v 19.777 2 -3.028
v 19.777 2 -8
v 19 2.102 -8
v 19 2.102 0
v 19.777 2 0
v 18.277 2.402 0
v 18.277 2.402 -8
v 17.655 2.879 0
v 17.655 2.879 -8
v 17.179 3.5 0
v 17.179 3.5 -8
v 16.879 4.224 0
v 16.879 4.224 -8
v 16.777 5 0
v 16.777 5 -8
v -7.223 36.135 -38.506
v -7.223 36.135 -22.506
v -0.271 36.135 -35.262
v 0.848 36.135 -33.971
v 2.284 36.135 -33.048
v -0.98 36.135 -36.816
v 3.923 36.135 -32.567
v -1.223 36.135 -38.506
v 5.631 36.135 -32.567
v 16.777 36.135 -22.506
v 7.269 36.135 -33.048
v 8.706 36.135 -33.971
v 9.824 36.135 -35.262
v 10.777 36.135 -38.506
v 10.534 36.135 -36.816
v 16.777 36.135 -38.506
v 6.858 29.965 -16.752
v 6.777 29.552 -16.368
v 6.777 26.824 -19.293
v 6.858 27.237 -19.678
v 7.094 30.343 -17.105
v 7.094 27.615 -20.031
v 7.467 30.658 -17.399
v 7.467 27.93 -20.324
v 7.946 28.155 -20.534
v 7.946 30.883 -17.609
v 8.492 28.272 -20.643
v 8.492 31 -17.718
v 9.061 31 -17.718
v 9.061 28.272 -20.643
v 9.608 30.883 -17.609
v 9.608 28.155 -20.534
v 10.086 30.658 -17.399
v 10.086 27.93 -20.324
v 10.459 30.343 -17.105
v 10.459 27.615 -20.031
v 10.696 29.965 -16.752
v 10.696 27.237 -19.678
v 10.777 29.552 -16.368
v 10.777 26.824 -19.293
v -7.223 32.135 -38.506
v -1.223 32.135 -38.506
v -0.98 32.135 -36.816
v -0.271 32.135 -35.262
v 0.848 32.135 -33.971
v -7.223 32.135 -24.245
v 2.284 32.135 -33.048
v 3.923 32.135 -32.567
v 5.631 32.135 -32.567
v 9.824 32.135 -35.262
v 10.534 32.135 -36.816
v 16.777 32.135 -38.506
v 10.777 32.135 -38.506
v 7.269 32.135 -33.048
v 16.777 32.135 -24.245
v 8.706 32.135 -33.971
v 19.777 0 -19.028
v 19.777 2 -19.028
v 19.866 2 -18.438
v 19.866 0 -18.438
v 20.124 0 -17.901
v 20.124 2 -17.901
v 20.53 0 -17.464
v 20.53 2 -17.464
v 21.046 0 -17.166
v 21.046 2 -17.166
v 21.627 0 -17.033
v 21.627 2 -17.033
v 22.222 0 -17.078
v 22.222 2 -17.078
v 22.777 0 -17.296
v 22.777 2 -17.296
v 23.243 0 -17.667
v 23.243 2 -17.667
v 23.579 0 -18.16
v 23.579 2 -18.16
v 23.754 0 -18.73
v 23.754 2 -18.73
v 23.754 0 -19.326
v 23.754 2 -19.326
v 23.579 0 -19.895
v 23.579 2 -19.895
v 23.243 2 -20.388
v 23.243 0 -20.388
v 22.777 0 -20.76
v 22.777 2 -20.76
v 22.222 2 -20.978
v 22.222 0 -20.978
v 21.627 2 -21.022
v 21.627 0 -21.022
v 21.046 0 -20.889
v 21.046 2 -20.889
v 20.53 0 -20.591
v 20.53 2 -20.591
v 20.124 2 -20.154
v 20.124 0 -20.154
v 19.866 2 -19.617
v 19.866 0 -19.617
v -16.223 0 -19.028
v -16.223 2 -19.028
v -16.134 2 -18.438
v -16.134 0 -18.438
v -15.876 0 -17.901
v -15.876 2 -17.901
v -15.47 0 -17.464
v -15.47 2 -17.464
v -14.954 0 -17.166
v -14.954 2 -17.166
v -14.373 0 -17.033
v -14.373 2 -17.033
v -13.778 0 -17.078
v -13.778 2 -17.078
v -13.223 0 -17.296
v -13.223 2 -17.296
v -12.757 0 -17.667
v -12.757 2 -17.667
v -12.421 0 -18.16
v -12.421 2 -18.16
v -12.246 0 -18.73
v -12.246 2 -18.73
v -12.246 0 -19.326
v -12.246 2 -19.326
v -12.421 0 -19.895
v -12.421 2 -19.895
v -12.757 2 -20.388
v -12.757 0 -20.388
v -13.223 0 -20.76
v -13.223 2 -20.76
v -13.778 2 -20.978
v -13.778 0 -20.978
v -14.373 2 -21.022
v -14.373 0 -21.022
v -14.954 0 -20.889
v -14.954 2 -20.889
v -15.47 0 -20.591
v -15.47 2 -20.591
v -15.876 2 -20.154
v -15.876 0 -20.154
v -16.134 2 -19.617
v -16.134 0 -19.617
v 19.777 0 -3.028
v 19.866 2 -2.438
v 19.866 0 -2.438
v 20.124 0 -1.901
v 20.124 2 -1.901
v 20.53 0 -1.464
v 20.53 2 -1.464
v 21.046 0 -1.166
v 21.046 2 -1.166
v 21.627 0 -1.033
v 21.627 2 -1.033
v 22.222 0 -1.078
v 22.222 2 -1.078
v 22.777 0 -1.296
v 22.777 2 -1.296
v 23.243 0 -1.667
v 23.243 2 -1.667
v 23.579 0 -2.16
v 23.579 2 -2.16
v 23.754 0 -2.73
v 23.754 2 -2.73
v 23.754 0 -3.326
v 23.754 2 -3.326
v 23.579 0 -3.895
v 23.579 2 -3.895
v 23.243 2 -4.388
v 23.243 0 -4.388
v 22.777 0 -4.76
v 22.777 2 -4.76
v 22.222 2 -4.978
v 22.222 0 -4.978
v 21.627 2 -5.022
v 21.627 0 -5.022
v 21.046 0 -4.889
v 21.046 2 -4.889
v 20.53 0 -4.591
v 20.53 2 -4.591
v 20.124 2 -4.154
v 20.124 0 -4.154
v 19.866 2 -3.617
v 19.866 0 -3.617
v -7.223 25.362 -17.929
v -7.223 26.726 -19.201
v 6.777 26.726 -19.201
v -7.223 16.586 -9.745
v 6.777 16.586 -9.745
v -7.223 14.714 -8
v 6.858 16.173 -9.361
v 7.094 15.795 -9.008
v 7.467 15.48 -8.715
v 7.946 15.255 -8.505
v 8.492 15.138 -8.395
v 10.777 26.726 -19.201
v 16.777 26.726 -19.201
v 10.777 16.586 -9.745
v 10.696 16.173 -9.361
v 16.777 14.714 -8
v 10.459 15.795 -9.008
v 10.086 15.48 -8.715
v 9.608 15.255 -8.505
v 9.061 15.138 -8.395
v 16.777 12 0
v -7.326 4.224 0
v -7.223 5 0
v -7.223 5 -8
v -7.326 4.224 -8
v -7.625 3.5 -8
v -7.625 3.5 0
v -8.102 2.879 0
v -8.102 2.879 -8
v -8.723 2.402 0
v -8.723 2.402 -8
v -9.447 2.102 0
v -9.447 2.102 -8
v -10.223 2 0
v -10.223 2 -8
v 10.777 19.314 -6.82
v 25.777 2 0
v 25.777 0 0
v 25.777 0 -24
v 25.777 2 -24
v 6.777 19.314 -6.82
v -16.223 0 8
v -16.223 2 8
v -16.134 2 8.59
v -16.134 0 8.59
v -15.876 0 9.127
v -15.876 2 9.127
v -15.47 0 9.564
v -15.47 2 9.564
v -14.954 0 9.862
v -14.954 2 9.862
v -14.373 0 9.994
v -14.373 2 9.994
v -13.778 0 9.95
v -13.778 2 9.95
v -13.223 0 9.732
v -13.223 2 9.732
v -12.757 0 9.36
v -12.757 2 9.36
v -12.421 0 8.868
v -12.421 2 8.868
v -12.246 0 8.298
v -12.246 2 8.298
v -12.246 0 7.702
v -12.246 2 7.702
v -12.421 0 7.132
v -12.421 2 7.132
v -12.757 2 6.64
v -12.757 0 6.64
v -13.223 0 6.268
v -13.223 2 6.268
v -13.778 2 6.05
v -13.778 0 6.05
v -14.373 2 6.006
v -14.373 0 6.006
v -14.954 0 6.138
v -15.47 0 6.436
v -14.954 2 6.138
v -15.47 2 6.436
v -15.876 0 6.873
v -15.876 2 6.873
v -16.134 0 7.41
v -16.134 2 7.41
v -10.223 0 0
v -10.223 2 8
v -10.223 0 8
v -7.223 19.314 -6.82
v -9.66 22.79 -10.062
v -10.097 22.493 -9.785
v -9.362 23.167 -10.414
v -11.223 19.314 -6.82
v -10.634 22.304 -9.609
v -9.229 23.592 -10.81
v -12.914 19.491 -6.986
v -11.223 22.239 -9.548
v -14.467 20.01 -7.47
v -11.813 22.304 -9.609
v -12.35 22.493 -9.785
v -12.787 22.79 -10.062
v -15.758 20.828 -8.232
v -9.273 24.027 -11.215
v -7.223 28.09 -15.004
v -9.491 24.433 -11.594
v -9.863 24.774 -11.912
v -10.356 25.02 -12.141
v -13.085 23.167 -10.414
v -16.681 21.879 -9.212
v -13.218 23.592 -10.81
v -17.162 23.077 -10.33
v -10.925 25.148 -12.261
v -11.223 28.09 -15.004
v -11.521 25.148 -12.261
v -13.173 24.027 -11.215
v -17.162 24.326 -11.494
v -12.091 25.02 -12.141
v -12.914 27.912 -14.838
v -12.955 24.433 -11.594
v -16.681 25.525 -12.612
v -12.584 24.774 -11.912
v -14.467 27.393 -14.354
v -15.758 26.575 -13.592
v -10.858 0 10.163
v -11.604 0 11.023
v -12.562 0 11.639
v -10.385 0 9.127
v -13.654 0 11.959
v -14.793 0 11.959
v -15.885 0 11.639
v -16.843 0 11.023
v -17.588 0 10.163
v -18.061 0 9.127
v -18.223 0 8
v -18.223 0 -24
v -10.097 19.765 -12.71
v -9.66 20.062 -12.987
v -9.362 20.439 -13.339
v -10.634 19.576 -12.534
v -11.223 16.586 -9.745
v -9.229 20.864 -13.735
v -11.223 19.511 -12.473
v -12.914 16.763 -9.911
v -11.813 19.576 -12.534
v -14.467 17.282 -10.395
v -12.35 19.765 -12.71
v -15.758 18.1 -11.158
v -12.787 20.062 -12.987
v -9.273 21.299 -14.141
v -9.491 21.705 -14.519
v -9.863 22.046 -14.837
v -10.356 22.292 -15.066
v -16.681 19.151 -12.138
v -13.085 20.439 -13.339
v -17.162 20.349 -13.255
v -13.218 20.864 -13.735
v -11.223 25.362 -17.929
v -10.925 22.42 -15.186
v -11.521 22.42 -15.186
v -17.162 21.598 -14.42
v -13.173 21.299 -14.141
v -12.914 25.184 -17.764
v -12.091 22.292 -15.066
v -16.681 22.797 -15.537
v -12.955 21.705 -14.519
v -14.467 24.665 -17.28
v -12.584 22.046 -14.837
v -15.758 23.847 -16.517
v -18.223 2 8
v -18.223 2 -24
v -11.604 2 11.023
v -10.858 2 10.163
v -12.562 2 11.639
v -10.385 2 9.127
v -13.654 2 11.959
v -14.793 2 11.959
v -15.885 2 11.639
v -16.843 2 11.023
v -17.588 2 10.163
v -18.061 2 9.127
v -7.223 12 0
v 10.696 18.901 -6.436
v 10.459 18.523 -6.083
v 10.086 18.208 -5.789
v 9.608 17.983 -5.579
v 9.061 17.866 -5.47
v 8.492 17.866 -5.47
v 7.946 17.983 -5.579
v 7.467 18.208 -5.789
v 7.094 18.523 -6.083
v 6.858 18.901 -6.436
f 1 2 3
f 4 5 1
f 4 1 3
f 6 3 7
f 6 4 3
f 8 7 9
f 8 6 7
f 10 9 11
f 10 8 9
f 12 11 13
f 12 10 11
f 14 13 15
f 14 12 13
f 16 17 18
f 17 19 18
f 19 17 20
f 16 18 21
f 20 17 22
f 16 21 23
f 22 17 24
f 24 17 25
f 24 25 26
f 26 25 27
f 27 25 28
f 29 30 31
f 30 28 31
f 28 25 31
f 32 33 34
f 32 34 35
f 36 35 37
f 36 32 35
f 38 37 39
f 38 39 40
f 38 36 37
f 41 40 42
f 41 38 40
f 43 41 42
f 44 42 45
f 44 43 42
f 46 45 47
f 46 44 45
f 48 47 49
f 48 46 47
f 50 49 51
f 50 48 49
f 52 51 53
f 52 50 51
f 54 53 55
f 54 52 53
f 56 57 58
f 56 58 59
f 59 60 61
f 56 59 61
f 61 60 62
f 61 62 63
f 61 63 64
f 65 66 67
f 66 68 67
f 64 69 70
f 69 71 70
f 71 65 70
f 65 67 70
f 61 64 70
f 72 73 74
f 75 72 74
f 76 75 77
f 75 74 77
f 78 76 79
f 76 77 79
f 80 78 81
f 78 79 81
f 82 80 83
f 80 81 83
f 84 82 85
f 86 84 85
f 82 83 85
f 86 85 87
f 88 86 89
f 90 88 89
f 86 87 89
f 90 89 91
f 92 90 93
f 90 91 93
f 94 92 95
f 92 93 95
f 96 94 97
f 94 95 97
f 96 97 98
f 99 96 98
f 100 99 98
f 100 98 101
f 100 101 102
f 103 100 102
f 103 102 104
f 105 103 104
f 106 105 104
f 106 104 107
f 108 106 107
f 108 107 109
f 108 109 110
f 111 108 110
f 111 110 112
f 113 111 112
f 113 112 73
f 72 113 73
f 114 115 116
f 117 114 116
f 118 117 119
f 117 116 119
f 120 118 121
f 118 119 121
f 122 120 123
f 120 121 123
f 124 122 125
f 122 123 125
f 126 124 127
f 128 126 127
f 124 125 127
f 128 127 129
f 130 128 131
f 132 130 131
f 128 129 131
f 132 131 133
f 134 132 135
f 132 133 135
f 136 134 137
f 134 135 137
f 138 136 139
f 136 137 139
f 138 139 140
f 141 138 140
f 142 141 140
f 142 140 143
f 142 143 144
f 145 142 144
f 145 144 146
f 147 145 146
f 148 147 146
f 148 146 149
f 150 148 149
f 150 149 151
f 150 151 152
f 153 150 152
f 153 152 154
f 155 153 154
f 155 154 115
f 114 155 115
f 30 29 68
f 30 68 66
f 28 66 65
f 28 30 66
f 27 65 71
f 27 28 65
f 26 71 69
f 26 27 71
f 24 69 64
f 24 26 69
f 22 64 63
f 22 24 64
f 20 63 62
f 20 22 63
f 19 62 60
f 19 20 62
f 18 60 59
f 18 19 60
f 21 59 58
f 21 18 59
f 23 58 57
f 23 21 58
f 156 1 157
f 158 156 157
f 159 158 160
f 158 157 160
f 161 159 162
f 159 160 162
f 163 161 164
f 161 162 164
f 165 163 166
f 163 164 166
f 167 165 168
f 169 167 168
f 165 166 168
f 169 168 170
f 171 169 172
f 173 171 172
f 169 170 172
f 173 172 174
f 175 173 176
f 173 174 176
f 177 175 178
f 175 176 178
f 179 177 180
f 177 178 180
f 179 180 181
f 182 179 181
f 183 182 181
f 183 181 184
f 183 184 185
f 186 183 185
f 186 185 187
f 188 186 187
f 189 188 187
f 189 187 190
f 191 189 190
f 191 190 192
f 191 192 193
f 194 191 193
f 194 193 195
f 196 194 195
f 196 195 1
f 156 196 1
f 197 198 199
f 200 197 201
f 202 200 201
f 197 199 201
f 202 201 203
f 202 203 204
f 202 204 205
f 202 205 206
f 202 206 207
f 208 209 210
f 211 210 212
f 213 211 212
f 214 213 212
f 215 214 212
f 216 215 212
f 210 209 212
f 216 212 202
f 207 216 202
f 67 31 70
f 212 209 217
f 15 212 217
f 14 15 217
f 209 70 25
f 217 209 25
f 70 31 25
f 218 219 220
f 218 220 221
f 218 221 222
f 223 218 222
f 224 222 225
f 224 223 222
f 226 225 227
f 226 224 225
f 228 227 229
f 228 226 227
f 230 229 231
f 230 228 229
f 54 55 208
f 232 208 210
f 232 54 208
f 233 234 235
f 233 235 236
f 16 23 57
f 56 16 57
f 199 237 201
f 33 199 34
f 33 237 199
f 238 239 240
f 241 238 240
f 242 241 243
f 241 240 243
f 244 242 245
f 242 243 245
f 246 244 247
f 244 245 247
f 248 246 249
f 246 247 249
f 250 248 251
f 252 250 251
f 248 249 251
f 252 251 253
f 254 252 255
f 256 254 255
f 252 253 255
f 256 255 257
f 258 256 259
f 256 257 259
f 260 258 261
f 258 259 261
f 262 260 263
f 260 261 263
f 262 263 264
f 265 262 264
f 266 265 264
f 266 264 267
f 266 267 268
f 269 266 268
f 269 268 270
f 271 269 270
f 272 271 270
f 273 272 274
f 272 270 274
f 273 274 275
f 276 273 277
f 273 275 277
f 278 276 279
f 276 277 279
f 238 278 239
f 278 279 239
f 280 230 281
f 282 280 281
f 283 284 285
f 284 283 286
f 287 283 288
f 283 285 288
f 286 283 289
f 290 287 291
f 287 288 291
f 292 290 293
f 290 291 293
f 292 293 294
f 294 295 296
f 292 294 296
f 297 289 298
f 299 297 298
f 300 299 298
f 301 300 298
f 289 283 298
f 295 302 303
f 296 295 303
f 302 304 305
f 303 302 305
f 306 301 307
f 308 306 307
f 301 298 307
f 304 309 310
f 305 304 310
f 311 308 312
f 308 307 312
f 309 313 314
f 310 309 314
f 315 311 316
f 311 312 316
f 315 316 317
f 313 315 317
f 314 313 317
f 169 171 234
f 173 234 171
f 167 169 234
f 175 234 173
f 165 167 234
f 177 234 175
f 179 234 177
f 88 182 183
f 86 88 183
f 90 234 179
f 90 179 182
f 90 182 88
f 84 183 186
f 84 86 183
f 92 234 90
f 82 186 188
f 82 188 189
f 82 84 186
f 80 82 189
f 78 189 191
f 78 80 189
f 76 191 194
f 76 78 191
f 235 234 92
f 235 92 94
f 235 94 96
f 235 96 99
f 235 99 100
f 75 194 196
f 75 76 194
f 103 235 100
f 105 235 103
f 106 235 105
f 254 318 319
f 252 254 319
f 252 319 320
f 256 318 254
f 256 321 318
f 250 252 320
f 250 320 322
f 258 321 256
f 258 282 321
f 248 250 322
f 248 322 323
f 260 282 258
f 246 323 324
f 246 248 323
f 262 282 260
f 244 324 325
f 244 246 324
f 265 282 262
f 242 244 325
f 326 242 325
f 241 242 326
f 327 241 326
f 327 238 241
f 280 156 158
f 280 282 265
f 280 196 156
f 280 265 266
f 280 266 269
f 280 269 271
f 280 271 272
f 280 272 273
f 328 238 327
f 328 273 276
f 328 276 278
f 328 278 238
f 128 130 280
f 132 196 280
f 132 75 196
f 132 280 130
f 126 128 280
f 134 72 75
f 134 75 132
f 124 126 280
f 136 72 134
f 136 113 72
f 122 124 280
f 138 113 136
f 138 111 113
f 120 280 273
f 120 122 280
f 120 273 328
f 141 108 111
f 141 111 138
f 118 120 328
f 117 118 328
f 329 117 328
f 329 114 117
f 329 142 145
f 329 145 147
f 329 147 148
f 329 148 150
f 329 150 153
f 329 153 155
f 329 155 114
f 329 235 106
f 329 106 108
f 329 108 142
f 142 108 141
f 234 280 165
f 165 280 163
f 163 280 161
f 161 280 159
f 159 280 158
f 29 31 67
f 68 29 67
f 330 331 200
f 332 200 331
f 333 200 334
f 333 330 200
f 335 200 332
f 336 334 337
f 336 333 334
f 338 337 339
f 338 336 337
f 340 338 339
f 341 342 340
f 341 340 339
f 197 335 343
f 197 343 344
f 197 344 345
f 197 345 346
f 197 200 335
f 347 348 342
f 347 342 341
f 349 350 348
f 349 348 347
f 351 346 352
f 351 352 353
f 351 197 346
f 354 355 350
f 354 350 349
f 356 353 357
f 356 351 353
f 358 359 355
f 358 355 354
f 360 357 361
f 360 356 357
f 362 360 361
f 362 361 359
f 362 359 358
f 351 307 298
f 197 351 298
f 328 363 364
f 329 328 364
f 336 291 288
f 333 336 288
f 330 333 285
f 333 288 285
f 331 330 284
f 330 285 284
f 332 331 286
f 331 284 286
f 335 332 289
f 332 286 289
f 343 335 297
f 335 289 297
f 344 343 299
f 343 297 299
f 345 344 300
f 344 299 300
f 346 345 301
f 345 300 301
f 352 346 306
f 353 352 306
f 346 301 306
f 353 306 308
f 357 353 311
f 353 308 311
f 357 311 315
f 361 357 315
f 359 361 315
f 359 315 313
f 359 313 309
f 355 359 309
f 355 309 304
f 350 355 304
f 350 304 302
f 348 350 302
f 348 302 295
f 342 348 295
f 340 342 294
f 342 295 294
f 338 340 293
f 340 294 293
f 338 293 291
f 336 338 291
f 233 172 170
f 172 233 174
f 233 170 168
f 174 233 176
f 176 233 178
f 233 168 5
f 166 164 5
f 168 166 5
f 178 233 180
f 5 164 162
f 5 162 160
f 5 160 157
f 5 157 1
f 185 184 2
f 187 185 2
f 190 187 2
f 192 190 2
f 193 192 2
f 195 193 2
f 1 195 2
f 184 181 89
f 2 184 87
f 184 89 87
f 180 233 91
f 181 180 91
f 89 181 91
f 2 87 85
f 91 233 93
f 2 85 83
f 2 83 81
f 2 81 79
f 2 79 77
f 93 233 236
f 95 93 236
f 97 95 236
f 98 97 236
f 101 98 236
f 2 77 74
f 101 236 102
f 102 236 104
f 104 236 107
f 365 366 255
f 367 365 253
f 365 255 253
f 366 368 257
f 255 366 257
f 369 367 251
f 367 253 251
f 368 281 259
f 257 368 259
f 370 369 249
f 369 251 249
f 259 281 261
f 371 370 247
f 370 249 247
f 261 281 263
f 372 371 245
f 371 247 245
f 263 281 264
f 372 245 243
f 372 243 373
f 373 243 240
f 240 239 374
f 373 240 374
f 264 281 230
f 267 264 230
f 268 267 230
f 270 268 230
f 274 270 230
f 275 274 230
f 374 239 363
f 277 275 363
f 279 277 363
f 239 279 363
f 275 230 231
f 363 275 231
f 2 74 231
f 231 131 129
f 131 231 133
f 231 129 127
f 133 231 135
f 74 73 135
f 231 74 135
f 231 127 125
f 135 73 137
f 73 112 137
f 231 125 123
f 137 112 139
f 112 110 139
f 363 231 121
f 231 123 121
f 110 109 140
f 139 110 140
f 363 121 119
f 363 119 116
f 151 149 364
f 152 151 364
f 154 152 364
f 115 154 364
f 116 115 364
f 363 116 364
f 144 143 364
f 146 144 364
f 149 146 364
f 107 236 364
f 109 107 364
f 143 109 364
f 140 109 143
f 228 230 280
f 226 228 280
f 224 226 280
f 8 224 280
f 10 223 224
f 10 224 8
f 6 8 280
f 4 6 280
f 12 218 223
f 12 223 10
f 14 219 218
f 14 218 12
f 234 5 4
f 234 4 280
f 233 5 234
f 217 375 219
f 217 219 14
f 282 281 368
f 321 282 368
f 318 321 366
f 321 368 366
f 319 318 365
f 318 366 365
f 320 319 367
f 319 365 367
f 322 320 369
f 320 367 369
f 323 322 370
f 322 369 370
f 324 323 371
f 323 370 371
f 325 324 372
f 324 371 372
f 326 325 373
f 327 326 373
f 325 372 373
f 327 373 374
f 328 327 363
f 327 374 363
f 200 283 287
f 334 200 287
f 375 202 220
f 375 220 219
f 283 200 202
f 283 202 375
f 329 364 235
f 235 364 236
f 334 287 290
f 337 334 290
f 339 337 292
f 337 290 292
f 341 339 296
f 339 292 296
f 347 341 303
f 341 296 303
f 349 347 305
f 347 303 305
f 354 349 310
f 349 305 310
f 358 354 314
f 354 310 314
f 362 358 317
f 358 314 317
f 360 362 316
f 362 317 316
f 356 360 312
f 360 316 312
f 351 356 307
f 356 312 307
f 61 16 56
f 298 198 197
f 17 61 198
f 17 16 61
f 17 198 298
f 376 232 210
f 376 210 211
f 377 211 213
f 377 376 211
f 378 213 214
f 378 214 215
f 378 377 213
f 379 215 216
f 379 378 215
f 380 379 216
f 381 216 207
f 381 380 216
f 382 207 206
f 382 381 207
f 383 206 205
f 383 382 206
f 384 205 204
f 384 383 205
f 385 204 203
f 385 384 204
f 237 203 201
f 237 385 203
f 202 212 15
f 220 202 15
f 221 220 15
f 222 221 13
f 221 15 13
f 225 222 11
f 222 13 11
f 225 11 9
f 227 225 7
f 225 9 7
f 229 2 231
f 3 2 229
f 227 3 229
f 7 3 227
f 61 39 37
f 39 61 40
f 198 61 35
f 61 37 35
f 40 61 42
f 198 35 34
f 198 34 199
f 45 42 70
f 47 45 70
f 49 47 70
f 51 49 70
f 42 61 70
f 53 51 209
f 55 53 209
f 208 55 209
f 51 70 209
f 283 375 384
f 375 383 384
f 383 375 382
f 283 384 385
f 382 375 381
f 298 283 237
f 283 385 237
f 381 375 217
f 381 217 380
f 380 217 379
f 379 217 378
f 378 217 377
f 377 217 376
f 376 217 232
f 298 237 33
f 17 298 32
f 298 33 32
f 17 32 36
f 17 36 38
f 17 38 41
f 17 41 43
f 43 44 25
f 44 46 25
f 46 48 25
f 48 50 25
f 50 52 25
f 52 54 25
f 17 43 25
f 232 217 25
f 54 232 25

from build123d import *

# Parameters (mm, degrees)
BOSS_EXTRUDE1_DEPTH = 24
BOSS_EXTRUDE2_DEPTH = 8
SKETCH2_R           = 2
BOSS_EXTRUDE3_DEPTH = 2
SKETCH3_R           = 2
CUT_EXTRUDE1_DEPTH  = 37.612003683
BOSS_EXTRUDE4_DEPTH = 24
SKETCH6_R           = 2
BOSS_EXTRUDE5_DEPTH = 4
CUT_EXTRUDE2_DEPTH  = 4
CUT_EXTRUDE4_DEPTH  = 59.761051842


with BuildPart() as part:
    # Sketch1 → Boss-Extrude1 (new body)
    with BuildSketch(Plane.XY):
        Polygon((-18.223289316, 0), (-16.691476591, 0), (25.776710684, 0), (25.776710684, 2), (19.776710684, 2), (16.776710684, 2), (-7.223289316, 2), (-10.223289316, 2), (-18.223289316, 2), align=None)
    extrude(amount=-BOSS_EXTRUDE1_DEPTH)

    # Sketch1<4> → Boss-Extrude2 (add)
    with BuildSketch(Plane.XY):
        with BuildLine():
            Line((16.776710684, 2), (19.776710684, 2))
            ThreePointArc((19.776710684, 2), (17.655390341, 2.878679656), (16.776710684, 5))
            Line((16.776710684, 5), (16.776710684, 12))
            Line((16.776710684, 12), (-7.223289316, 12))
            Line((-7.223289316, 12), (-7.223289316, 5))
            ThreePointArc((-7.223289316, 5), (-8.101968972, 2.878679656), (-10.223289316, 2))
            Line((-10.223289316, 2), (-7.223289316, 2))
            Line((-7.223289316, 2), (16.776710684, 2))
        make_face()
    extrude(amount=-BOSS_EXTRUDE2_DEPTH)

    # Sketch2 → Boss-Extrude3 (add)
    with BuildSketch(Plane(origin=(0, 2, 0), x_dir=(1, 0, 0), z_dir=(0, 1, 0))):
        with BuildLine():
            Line((-18.223289316, 0), (-10.223289316, 0))
            Line((-10.223289316, 0), (-10.223289316, -8))
            ThreePointArc((-10.223289316, -8), (-14.223289316, -12), (-18.223289316, -8))
            Line((-18.223289316, -8), (-18.223289316, 0))
        make_face()
        with Locations((-14.223289316, -8)):
            Circle(SKETCH2_R, mode=Mode.SUBTRACT)
    extrude(amount=-BOSS_EXTRUDE3_DEPTH)

    # Sketch3 → Cut-Extrude1 (cut, through all)
    with BuildSketch(Plane(origin=(0, 2, 0), x_dir=(1, 0, 0), z_dir=(0, 1, 0))):
        with Locations((21.776710684, 3.027714233)):
            Circle(SKETCH3_R)
        with Locations((21.776710684, 19.027714233)):
            Circle(SKETCH3_R)
        with Locations((-14.223289316, 19.027714233)):
            Circle(SKETCH3_R)
    extrude(amount=-CUT_EXTRUDE1_DEPTH, mode=Mode.SUBTRACT)

    # Sketch5 → Boss-Extrude4 (add)
    with BuildSketch(Plane(origin=(16.776710684, 0, 0), x_dir=(0, 0, -1), z_dir=(1, 0, 0))):
        Polygon((8, 12), (0, 12), (22.505945882, 36.134672153), (38.505945882, 36.134672153), (38.505945882, 32.134672153), (24.245195382, 32.134672153), (19.201196493, 26.725645572), (8, 14.713832938), align=None)
    extrude(amount=-BOSS_EXTRUDE4_DEPTH)

    # Sketch6 → Boss-Extrude5 (add)
    # profile 1 of 2: a face of its own
    with BuildSketch(Plane(origin=(0, 5.581461158, 5.985384302), x_dir=(1, 0, 0), z_dir=(0, 0.6819983600624966, 0.7313537016191722))):
        with BuildLine():
            Line((-7.223289316, 18.776244419), (-11.223289316, 18.776244419))
            ThreePointArc((-11.223289316, 18.776244419), (-17.223289316, 24.776244419), (-11.223289316, 30.776244419))
            Line((-11.223289316, 30.776244419), (-7.223289316, 30.776244419))
            Line((-7.223289316, 30.776244419), (-7.223289316, 18.776244419))
        make_face()
        with Locations((-11.223289316, 24.776244419)):
            Circle(SKETCH6_R, mode=Mode.SUBTRACT)
    # profile 2 of 2: a face of its own
    with BuildSketch(Plane(origin=(0, 5.581461158, 5.985384302), x_dir=(1, 0, 0), z_dir=(0, 0.6819983600624966, 0.7313537016191722))):
        with BuildLine():
            Line((10.776710684, 32.776244419), (10.776710684, 18.776244419))
            ThreePointArc((10.776710684, 18.776244419), (8.776710684, 16.776244419), (6.776710684, 18.776244419))
            Line((6.776710684, 18.776244419), (6.776710684, 32.776244419))
            ThreePointArc((6.776710684, 32.776244419), (8.776710684, 34.776244419), (10.776710684, 32.776244419))
        make_face()
    extrude(amount=-BOSS_EXTRUDE5_DEPTH)

    # Sketch6<5> → Cut-Extrude2 (cut)
    with BuildSketch(Plane(origin=(0, 5.581461158, 5.985384302), x_dir=(1, 0, 0), z_dir=(0, 0.6819983600624966, 0.7313537016191722))):
        with BuildLine():
            Line((10.776710684, 18.776244419), (10.776710684, 32.776244419))
            ThreePointArc((10.776710684, 32.776244419), (8.776710684, 34.776244419), (6.776710684, 32.776244419))
            Line((6.776710684, 32.776244419), (6.776710684, 18.776244419))
            ThreePointArc((6.776710684, 18.776244419), (8.776710684, 16.776244419), (10.776710684, 18.776244419))
        make_face()
    extrude(amount=-CUT_EXTRUDE2_DEPTH, mode=Mode.SUBTRACT)

    # Sketch7 → Cut-Extrude4 (cut, through all)
    with BuildSketch(Plane(origin=(0, 36.134672153, 0), x_dir=(1, 0, 0), z_dir=(0, 1, 0))):
        with BuildLine():
            Line((-1.223289316, 38.505945882), (10.776710684, 38.505945882))
            ThreePointArc((10.776710684, 38.505945882), (4.776710684, 32.505945882), (-1.223289316, 38.505945882))
        make_face()
    extrude(amount=-CUT_EXTRUDE4_DEPTH, mode=Mode.SUBTRACT)


solid = part.part
